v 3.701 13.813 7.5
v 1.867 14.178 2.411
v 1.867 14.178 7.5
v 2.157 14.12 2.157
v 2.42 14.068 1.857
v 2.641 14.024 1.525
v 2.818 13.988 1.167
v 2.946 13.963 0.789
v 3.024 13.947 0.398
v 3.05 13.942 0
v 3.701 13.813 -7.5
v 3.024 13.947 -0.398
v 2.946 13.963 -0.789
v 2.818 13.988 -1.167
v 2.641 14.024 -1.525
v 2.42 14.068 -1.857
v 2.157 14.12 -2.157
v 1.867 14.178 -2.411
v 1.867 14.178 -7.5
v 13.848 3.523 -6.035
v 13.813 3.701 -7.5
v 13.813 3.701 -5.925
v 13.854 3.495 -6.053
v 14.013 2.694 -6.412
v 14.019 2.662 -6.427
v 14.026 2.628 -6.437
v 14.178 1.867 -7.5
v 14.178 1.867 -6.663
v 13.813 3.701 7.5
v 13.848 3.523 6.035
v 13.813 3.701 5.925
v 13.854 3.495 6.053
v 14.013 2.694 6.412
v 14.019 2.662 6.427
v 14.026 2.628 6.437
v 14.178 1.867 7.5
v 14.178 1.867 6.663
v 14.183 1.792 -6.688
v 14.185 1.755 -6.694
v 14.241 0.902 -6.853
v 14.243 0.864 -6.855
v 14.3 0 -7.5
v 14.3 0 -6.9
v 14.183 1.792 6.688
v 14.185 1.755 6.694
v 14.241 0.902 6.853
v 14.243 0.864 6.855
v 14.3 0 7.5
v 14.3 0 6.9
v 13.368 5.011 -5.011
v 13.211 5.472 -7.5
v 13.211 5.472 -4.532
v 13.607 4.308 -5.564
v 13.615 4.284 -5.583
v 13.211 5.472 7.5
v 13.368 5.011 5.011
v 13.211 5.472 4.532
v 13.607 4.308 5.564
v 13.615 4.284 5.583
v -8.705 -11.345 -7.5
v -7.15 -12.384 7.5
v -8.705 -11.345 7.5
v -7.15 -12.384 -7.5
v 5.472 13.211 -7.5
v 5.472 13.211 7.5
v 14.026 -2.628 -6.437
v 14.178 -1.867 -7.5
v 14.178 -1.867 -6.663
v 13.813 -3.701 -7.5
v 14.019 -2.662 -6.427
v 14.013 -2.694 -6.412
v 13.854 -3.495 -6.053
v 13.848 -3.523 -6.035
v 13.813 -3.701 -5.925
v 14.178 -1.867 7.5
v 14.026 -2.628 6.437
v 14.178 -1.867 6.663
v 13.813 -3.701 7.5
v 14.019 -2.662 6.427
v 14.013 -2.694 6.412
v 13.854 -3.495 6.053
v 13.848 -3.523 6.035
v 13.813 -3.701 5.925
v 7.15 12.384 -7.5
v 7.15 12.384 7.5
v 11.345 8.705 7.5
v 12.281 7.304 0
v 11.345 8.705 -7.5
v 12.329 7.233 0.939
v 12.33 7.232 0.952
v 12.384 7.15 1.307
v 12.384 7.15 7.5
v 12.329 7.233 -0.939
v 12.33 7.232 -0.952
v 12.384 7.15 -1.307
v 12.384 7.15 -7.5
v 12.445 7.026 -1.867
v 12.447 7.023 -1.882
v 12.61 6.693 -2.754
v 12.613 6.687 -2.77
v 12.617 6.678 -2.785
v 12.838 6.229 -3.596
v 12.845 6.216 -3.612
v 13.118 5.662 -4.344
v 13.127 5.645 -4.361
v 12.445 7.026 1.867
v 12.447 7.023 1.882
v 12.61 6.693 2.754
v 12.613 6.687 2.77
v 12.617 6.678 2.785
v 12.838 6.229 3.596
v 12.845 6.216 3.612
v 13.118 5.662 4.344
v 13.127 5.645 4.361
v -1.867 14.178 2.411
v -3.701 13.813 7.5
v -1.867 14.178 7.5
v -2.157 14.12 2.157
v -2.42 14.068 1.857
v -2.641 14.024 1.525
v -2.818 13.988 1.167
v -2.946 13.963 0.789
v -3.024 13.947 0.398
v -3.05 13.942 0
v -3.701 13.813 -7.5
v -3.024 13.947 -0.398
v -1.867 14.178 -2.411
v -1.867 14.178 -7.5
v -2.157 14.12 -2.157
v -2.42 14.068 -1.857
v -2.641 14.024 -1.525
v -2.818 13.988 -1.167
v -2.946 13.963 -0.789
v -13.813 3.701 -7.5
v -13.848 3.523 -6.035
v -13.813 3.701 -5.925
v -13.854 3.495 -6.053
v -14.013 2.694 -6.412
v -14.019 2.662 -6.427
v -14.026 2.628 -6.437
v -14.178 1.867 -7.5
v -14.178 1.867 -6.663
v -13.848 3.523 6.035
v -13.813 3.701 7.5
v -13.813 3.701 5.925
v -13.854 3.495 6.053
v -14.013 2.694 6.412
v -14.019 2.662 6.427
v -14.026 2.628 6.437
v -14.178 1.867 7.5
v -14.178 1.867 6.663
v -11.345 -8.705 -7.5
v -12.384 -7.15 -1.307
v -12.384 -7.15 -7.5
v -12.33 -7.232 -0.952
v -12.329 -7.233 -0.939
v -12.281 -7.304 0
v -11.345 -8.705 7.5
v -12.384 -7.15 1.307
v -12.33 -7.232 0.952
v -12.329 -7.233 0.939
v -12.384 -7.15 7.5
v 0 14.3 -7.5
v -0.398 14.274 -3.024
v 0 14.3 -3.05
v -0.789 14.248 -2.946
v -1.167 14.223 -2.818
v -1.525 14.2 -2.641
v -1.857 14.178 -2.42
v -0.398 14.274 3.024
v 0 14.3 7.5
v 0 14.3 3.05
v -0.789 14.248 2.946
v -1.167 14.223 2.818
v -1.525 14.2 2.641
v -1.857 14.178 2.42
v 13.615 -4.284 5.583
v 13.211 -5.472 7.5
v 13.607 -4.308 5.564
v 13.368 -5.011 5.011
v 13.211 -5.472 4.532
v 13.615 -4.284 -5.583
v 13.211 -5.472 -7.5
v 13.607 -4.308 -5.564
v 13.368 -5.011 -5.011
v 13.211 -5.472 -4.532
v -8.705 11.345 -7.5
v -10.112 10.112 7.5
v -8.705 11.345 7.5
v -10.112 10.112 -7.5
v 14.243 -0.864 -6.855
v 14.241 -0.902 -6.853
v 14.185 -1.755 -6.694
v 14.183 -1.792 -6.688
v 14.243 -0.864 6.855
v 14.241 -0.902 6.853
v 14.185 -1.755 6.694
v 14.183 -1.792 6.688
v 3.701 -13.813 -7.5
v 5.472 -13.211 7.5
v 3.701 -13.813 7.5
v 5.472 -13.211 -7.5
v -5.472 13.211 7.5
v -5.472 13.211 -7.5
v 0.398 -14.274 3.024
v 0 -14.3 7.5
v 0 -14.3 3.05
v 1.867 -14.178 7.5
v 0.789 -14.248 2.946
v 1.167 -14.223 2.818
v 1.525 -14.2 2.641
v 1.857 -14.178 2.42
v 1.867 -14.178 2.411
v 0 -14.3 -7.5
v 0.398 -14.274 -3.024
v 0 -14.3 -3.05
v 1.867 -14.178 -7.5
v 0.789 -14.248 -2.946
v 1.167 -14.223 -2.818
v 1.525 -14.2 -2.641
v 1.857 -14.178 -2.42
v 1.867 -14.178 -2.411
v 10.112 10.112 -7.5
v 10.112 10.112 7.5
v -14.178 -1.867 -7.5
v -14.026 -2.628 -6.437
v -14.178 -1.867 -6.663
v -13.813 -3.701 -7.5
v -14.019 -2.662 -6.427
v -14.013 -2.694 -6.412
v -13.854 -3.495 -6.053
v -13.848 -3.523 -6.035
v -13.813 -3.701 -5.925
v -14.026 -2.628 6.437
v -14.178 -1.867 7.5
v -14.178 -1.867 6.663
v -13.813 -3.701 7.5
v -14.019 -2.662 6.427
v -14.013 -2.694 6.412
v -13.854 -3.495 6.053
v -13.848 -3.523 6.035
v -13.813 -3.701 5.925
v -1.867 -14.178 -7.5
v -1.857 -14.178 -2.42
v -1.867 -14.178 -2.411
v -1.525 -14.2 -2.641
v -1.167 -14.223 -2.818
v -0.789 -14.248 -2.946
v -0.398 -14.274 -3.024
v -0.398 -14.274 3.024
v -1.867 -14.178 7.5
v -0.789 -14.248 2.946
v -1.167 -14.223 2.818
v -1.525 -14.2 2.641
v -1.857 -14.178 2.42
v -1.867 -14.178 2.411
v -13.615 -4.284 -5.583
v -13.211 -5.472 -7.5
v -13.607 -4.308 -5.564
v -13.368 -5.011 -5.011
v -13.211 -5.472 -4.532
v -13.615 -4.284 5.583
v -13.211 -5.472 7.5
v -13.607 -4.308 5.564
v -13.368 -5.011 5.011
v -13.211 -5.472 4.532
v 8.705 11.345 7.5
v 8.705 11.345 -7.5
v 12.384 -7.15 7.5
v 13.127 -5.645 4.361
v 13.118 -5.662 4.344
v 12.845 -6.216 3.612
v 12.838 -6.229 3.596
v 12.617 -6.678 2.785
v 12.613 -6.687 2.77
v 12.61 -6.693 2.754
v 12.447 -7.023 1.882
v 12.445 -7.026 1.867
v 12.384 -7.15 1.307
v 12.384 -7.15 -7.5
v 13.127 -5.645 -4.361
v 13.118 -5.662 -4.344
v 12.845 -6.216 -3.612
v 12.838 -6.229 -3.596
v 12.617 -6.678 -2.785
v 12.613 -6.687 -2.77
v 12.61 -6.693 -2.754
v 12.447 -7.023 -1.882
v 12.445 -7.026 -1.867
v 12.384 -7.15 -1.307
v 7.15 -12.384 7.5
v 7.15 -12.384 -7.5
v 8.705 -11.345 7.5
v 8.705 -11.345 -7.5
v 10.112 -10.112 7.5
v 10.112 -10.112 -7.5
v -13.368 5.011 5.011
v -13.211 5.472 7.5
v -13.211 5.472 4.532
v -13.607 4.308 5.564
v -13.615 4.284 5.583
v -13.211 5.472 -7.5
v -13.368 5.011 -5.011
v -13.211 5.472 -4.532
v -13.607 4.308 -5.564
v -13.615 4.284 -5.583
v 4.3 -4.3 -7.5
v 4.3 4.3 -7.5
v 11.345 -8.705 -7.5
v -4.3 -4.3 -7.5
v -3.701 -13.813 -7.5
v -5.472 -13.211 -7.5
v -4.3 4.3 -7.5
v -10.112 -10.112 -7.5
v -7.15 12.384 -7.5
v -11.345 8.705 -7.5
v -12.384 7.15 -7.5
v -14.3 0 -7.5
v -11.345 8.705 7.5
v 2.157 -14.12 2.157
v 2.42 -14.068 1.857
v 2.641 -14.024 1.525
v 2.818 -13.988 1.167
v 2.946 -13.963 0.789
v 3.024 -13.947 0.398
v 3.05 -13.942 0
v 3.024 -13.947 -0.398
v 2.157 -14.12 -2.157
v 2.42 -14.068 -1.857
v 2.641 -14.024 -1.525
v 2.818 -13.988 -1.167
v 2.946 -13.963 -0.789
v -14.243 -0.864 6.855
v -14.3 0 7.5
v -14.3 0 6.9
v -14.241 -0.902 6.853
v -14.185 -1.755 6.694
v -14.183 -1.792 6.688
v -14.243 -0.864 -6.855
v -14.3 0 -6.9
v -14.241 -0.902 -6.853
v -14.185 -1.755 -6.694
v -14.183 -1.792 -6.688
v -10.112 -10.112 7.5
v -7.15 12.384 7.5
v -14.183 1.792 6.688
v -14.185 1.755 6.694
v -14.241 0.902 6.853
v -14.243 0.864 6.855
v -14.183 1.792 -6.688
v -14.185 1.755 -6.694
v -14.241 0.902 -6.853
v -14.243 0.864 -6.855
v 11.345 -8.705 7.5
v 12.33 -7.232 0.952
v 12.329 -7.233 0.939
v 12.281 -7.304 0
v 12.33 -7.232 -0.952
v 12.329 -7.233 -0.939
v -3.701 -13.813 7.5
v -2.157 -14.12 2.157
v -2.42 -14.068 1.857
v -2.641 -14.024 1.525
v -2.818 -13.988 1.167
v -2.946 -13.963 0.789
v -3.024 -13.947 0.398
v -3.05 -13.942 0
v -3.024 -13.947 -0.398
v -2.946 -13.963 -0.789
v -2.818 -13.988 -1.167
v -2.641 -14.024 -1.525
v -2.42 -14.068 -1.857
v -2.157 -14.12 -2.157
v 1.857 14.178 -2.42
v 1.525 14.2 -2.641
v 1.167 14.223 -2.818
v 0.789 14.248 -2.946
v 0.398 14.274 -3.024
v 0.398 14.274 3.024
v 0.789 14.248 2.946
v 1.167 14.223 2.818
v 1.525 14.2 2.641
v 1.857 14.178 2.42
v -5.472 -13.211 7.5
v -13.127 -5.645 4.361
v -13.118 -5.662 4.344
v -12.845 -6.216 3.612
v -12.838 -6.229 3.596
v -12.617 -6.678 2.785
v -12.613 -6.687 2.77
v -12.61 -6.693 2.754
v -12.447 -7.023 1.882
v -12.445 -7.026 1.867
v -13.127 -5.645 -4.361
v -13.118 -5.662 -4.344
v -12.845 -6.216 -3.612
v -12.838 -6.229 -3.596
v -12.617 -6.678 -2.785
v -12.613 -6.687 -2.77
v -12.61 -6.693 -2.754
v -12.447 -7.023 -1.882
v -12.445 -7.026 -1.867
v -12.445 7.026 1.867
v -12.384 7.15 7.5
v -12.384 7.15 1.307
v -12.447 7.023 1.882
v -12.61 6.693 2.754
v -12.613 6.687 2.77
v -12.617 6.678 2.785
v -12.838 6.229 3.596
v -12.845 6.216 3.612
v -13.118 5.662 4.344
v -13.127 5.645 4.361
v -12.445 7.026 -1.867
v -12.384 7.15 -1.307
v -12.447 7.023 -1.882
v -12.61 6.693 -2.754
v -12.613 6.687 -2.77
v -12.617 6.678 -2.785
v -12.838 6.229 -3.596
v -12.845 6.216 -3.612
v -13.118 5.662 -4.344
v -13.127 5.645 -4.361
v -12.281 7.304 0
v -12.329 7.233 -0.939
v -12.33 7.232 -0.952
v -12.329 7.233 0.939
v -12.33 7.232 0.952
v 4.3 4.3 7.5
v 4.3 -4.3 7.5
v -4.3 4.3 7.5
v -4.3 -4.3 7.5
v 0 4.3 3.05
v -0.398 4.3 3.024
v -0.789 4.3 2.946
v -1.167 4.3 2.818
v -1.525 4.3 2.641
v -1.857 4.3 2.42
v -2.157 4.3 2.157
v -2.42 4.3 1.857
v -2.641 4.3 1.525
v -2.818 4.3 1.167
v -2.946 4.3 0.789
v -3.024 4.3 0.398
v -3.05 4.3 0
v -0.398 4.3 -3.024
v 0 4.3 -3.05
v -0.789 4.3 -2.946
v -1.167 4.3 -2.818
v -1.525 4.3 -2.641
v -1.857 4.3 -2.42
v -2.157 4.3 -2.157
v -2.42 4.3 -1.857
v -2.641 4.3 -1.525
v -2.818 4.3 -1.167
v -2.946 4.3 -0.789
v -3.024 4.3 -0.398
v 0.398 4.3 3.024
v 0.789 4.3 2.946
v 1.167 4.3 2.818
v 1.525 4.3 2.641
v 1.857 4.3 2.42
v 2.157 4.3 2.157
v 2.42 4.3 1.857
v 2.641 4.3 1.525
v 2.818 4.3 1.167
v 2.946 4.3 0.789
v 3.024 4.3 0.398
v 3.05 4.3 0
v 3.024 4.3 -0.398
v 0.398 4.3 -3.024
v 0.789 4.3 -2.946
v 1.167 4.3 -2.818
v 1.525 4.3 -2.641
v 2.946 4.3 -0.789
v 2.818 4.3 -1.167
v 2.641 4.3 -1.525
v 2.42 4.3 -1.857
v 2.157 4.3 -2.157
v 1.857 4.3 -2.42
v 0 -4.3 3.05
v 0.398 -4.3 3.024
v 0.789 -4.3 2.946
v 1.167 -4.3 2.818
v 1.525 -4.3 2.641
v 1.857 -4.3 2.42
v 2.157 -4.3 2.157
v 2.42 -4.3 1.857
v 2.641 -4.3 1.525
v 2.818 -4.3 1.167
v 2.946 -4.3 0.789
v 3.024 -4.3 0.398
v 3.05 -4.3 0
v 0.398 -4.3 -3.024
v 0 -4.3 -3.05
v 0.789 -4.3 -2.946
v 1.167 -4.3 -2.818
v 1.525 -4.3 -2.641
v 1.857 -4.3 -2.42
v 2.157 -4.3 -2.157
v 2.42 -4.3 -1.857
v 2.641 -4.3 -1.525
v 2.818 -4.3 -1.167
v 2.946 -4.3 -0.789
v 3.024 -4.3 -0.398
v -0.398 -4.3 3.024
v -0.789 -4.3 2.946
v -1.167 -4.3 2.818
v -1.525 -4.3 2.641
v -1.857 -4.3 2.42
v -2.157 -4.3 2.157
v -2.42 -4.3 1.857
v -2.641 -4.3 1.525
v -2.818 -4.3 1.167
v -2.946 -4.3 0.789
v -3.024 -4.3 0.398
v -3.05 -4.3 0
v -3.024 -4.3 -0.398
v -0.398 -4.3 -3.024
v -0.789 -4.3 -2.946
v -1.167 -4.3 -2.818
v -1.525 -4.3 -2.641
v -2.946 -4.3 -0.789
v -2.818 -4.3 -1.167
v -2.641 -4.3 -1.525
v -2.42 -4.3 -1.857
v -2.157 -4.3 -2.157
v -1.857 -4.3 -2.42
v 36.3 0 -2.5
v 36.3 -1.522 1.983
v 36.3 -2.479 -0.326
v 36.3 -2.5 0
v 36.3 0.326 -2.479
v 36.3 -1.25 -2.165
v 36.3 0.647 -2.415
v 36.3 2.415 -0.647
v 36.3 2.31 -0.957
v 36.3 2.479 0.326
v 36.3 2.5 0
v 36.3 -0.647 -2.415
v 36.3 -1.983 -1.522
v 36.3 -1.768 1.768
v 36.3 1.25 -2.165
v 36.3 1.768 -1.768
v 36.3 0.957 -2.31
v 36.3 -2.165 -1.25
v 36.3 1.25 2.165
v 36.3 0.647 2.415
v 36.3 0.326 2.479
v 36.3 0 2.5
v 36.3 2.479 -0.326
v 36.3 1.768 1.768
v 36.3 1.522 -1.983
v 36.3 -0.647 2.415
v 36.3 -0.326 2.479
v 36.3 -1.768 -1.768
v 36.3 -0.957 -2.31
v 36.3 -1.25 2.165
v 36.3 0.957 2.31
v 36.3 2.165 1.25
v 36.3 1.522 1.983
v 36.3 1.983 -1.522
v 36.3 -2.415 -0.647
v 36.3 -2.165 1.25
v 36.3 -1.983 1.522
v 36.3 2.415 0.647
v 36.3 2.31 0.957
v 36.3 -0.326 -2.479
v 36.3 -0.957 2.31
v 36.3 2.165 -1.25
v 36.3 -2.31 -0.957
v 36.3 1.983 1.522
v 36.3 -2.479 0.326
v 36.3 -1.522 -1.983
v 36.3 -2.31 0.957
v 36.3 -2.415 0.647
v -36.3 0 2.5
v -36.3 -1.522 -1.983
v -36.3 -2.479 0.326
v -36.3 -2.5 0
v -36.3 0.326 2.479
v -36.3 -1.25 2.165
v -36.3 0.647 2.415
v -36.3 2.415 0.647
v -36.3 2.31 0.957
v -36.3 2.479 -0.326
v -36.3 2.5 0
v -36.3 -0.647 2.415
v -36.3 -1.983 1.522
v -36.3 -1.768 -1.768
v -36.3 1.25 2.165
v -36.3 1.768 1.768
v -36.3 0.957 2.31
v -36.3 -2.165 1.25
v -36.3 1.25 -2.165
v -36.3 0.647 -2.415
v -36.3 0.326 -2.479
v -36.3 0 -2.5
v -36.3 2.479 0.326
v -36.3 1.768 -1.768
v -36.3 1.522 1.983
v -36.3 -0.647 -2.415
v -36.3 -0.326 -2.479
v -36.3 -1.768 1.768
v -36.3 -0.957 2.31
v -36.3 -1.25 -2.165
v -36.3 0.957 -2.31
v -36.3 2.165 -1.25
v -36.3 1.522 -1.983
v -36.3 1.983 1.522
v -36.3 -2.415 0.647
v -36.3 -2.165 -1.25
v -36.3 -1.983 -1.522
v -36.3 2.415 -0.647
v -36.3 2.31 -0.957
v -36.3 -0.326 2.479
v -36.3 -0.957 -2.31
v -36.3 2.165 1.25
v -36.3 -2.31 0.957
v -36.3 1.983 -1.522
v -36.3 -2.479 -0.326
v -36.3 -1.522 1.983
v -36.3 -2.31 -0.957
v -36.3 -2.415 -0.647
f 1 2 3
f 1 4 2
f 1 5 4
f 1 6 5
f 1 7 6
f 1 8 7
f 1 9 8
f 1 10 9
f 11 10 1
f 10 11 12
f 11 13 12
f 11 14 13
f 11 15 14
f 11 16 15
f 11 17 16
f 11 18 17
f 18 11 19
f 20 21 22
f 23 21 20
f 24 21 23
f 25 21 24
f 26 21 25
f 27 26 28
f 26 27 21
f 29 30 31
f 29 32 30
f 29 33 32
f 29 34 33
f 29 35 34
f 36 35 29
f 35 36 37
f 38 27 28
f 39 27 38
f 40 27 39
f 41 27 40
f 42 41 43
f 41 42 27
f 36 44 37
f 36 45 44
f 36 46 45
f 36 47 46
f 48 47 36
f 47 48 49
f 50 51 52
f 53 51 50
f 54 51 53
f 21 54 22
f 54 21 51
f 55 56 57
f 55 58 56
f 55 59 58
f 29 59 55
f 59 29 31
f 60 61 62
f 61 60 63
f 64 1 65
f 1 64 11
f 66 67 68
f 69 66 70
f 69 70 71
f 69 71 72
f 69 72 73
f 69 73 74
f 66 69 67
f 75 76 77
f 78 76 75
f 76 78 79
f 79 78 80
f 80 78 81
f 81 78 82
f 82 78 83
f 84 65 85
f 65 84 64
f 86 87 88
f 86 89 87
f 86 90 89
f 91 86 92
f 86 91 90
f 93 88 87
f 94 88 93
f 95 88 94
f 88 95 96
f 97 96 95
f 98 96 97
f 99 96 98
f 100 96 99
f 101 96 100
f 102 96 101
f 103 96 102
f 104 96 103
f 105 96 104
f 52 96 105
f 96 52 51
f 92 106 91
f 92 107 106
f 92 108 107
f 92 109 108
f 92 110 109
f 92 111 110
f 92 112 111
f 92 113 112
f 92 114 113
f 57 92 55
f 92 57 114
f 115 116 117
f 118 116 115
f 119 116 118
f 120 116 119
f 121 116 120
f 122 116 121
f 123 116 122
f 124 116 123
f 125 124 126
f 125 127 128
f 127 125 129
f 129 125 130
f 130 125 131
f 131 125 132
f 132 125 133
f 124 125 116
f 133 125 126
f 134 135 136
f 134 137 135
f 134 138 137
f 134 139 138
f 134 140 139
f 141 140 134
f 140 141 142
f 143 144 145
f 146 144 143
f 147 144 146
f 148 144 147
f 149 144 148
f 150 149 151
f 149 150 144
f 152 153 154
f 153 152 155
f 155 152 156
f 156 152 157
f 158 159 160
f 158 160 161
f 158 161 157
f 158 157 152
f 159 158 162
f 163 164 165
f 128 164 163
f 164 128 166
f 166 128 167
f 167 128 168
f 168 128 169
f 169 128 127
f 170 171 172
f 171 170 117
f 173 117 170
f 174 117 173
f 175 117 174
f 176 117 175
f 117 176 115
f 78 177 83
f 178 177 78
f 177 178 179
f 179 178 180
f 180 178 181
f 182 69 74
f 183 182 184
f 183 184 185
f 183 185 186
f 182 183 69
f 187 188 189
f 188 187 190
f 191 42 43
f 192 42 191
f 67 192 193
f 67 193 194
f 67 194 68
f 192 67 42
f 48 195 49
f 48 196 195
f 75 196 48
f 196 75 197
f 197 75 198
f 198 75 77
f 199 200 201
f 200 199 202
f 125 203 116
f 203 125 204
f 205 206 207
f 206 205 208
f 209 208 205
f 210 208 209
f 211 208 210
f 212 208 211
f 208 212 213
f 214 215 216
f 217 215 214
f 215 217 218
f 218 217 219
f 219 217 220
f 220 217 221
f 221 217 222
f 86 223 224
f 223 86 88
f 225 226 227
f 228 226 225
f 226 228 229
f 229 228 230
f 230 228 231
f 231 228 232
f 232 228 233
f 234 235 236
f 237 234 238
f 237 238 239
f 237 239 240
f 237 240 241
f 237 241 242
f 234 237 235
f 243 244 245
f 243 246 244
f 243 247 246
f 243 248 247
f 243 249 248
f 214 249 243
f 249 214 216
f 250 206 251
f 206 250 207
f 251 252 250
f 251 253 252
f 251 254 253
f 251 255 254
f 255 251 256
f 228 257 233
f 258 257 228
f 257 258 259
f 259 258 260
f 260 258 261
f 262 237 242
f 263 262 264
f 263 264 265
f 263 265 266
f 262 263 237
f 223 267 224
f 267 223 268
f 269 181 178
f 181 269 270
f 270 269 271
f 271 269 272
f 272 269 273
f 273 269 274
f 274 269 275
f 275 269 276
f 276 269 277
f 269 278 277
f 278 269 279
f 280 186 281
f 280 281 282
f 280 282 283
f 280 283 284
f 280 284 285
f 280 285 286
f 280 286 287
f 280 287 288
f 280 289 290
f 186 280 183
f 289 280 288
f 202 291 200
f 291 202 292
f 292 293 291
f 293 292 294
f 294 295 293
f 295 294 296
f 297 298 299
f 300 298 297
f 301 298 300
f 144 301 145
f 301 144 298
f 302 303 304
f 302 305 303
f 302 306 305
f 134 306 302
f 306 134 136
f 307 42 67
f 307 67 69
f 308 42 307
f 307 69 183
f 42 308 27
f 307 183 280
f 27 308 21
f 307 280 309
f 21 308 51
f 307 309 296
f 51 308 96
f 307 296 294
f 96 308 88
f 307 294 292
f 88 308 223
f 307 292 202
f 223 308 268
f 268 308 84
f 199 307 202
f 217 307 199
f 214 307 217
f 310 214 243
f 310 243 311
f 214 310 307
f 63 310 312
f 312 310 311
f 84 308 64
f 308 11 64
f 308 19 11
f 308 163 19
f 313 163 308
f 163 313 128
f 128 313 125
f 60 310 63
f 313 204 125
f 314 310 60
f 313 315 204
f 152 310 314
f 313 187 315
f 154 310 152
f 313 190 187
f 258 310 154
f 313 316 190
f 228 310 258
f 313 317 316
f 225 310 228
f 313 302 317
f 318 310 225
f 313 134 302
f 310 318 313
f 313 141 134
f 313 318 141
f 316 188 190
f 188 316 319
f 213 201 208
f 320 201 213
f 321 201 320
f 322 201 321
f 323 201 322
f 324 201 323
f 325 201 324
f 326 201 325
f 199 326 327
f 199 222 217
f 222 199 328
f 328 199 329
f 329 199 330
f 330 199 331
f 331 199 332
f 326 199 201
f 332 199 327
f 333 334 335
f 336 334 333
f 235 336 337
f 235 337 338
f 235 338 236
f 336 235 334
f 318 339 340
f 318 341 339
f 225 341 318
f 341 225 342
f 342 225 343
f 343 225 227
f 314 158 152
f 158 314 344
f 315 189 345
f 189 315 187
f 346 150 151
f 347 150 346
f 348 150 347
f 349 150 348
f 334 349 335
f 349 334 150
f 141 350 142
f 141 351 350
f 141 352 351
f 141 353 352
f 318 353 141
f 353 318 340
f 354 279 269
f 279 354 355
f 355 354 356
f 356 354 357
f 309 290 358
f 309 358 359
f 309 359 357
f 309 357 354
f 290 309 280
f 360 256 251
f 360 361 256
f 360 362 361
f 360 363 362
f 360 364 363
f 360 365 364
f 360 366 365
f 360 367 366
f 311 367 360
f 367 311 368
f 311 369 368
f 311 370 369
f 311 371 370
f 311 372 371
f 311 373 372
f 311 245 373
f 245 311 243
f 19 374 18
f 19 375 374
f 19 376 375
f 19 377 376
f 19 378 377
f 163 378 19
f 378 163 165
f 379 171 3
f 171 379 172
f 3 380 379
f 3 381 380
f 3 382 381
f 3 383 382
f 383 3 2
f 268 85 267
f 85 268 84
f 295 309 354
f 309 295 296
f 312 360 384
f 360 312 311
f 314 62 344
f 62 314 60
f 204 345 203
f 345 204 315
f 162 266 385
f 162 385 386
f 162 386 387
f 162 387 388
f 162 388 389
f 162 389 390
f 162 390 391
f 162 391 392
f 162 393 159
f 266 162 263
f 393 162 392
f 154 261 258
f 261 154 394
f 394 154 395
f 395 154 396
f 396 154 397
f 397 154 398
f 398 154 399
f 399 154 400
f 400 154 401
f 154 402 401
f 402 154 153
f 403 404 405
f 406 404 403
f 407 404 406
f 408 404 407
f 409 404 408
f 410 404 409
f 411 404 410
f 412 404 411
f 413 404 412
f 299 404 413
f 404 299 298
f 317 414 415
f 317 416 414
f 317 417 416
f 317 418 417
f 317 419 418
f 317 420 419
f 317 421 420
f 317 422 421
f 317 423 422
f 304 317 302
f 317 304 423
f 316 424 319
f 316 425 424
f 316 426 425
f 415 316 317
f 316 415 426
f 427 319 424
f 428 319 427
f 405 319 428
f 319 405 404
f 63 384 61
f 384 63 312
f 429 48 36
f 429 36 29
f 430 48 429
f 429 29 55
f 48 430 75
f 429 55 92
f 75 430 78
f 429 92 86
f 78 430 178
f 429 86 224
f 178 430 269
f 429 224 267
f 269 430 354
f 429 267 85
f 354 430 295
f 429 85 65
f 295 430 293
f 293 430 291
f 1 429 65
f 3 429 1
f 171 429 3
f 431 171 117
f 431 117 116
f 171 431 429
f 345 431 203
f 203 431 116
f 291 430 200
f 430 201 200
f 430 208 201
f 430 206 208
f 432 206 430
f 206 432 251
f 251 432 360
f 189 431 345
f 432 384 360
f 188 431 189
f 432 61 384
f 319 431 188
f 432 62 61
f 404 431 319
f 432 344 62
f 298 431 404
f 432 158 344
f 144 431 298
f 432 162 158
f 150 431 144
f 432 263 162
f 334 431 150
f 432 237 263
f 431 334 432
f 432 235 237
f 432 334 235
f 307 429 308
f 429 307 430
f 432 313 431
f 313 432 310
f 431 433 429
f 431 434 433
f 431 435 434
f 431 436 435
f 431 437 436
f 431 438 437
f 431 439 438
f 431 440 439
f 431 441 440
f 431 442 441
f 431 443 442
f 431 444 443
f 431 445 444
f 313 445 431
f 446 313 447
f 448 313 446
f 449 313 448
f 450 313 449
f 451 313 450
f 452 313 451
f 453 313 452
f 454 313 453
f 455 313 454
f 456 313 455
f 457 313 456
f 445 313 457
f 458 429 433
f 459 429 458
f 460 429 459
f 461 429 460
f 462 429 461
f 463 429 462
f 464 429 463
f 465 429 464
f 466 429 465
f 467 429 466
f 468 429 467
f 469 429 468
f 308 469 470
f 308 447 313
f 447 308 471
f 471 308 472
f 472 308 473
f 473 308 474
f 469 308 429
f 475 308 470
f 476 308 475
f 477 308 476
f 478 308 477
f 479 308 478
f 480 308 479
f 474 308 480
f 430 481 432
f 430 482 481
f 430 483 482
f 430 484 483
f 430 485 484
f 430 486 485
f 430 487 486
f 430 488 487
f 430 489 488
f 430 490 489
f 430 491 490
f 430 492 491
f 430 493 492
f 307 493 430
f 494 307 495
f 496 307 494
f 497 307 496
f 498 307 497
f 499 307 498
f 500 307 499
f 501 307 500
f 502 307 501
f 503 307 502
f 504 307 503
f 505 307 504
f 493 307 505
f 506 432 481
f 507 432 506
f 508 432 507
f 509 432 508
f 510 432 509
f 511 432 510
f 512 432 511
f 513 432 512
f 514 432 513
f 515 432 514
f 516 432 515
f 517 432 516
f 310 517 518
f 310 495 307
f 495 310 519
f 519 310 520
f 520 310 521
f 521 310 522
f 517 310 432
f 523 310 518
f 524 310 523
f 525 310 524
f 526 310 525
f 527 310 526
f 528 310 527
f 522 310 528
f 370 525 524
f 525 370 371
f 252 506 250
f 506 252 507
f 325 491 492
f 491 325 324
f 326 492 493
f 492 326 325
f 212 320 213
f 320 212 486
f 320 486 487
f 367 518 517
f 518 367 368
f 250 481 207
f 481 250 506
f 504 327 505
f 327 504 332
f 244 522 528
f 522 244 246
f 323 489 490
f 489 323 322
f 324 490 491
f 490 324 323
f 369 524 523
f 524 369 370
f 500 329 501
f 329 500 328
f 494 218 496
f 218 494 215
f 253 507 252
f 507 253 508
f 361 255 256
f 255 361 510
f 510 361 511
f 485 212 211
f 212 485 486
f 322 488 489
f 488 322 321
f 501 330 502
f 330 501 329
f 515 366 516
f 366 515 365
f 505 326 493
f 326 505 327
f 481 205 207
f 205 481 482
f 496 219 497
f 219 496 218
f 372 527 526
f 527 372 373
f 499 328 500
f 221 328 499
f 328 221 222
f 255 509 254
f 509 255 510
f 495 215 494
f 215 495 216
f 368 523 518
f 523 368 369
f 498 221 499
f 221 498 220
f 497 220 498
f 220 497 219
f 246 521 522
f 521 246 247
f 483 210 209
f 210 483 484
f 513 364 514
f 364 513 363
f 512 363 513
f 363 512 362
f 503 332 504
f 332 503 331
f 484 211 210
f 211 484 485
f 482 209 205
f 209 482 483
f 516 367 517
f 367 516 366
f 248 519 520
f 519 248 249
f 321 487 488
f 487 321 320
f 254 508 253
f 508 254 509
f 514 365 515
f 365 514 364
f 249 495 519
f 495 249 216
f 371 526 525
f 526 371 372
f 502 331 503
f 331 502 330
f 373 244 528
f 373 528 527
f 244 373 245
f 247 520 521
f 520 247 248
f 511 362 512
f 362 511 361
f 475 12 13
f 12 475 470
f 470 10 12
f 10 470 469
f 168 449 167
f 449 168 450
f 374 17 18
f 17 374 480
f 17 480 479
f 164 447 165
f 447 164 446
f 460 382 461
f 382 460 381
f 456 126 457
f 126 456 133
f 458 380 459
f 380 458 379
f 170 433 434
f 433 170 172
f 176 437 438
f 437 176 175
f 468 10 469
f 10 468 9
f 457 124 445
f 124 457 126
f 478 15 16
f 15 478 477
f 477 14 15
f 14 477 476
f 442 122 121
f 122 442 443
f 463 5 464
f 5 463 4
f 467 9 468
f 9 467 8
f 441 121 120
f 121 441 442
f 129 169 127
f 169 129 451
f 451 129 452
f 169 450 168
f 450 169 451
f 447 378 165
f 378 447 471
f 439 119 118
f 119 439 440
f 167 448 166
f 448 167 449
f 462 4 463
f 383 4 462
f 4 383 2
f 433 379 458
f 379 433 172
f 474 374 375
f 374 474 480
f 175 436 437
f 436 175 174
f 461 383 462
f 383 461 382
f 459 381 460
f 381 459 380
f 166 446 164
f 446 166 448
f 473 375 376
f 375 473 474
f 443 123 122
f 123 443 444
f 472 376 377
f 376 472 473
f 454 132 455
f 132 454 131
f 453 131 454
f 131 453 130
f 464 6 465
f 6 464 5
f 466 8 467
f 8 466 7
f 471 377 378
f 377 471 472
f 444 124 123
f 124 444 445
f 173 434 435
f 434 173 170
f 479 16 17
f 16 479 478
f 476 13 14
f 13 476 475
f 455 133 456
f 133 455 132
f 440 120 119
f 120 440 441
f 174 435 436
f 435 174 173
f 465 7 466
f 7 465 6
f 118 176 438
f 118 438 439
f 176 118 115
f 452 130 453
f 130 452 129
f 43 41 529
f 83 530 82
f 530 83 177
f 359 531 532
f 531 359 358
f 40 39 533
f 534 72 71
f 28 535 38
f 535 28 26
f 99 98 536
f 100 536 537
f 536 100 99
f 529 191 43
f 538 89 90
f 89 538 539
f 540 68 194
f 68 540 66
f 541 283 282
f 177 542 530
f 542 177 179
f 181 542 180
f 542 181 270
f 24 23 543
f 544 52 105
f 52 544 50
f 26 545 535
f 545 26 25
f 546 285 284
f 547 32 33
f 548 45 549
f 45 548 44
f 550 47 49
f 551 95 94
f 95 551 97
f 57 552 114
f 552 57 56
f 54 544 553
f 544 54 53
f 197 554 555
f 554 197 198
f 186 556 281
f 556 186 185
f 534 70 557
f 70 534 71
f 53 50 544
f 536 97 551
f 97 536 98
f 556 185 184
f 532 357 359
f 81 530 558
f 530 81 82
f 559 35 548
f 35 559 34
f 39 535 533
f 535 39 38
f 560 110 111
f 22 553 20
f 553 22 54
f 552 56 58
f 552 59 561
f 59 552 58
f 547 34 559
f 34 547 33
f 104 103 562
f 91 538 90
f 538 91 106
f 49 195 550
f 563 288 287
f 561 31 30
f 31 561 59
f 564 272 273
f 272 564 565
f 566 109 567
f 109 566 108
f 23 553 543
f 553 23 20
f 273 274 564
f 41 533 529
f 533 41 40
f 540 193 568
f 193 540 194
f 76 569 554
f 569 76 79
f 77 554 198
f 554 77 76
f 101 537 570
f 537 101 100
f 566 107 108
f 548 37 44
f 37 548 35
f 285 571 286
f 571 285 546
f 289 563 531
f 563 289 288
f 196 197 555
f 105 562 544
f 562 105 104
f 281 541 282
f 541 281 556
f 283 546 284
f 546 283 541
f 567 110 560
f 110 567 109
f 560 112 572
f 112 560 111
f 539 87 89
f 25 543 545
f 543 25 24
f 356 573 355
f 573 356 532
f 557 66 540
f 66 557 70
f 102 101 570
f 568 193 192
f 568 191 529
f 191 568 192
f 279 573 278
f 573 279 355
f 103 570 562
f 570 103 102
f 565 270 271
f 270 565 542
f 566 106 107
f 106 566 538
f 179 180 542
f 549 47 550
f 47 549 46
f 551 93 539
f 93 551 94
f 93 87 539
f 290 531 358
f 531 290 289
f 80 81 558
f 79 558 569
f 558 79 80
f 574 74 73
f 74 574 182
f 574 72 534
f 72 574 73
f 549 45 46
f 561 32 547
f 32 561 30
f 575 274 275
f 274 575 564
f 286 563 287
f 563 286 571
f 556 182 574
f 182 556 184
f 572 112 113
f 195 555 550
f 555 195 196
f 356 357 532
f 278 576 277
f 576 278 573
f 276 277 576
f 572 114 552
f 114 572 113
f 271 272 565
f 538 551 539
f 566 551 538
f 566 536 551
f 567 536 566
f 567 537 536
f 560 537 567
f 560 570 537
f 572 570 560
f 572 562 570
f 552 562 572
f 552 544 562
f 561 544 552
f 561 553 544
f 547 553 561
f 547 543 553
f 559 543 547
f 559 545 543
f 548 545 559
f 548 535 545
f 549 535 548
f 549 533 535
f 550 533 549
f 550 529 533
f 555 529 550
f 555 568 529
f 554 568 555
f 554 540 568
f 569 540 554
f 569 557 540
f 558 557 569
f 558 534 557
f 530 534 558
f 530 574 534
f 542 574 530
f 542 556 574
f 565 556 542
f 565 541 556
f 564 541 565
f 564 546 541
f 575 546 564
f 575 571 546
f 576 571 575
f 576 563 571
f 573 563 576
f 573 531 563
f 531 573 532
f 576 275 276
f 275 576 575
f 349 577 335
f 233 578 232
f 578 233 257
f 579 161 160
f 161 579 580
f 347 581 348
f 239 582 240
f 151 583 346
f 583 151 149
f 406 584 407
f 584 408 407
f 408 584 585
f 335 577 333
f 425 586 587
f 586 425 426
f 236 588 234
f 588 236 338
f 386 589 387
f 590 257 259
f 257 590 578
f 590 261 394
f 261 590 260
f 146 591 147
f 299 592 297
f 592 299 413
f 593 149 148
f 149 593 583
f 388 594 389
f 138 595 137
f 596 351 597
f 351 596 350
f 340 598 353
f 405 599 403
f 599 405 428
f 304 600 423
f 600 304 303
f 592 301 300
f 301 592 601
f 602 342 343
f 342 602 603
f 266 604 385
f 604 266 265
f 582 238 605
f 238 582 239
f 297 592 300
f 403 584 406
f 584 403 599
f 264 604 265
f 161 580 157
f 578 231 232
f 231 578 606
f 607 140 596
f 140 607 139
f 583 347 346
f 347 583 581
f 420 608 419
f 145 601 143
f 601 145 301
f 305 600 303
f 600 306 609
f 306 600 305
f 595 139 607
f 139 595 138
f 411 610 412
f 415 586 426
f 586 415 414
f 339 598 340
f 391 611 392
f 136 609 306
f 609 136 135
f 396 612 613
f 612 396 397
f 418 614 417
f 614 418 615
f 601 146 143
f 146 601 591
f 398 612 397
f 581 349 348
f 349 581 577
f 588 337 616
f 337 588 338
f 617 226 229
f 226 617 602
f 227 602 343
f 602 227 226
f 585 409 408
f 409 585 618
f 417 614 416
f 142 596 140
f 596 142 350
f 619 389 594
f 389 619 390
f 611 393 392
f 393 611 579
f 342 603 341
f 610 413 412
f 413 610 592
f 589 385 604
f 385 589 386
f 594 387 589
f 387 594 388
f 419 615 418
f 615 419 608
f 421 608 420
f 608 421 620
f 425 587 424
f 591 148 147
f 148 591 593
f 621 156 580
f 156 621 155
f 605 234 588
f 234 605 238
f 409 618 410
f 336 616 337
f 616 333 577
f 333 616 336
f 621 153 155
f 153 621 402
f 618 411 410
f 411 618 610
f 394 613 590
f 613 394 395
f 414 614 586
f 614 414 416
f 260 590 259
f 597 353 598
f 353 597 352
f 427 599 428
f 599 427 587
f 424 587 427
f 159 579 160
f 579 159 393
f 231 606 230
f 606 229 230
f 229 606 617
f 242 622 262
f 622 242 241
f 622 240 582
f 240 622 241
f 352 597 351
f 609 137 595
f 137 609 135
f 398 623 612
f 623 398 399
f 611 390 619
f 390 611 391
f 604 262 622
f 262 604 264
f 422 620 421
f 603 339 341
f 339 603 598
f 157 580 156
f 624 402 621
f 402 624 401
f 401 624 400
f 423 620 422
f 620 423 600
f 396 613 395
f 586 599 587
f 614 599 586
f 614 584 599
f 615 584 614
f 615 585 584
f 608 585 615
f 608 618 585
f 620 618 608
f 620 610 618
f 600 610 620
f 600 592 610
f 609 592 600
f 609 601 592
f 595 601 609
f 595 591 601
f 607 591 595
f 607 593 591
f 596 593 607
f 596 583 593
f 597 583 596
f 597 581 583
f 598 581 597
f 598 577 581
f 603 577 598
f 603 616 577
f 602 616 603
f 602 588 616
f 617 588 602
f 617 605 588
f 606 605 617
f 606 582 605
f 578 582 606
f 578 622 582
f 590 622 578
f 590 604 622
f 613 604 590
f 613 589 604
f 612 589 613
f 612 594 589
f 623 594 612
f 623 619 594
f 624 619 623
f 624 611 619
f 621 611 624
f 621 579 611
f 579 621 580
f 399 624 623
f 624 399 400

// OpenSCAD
$fn=48;

barSize=8.6;
mountWidth=15;
mountThickness=20;
arrowSize=25;
arrowHead=5;

screwDiameter=4;
insertDiameter=6.1;

module mount() {
    difference() {
        cylinder(h = mountWidth, d = mountThickness+barSize, center=true);
        cube([barSize,barSize,mountWidth], center=true);
    }
}

module arrows() {
    arrowDistance = (barSize+mountThickness)/2-3;
    translate([arrowDistance,0,0]) {
        rotate([0,90,0]) {
            cylinder(h = arrowSize, d1 = mountWidth, d2 = arrowHead);
        }
    }
    translate([-1*arrowDistance,0,0]) {
        rotate([0,-90,0]) {
            cylinder(h = arrowSize, d1 = mountWidth, d2 = arrowHead);
        }
    }
}

module screwHole () {
    rotate([90,0,0]) {
        translate([0,0,(mountThickness+barSize)/2]) {
            cylinder(h = mountThickness, d1 = screwDiameter, d2 = screwDiameter*3, center = true);
        }
    }
}

module screwInsert () {
    rotate([90,0,0]) {
        translate([0,0,(mountThickness+barSize)/2]) {
            cylinder(h = mountThickness, d = insertDiameter, center = true);
        }
    }
}

difference() {
    mount();
//    screwHole();
    screwInsert();
    rotate([180,0,0]) {
        screwInsert();
    }
}
arrows();
